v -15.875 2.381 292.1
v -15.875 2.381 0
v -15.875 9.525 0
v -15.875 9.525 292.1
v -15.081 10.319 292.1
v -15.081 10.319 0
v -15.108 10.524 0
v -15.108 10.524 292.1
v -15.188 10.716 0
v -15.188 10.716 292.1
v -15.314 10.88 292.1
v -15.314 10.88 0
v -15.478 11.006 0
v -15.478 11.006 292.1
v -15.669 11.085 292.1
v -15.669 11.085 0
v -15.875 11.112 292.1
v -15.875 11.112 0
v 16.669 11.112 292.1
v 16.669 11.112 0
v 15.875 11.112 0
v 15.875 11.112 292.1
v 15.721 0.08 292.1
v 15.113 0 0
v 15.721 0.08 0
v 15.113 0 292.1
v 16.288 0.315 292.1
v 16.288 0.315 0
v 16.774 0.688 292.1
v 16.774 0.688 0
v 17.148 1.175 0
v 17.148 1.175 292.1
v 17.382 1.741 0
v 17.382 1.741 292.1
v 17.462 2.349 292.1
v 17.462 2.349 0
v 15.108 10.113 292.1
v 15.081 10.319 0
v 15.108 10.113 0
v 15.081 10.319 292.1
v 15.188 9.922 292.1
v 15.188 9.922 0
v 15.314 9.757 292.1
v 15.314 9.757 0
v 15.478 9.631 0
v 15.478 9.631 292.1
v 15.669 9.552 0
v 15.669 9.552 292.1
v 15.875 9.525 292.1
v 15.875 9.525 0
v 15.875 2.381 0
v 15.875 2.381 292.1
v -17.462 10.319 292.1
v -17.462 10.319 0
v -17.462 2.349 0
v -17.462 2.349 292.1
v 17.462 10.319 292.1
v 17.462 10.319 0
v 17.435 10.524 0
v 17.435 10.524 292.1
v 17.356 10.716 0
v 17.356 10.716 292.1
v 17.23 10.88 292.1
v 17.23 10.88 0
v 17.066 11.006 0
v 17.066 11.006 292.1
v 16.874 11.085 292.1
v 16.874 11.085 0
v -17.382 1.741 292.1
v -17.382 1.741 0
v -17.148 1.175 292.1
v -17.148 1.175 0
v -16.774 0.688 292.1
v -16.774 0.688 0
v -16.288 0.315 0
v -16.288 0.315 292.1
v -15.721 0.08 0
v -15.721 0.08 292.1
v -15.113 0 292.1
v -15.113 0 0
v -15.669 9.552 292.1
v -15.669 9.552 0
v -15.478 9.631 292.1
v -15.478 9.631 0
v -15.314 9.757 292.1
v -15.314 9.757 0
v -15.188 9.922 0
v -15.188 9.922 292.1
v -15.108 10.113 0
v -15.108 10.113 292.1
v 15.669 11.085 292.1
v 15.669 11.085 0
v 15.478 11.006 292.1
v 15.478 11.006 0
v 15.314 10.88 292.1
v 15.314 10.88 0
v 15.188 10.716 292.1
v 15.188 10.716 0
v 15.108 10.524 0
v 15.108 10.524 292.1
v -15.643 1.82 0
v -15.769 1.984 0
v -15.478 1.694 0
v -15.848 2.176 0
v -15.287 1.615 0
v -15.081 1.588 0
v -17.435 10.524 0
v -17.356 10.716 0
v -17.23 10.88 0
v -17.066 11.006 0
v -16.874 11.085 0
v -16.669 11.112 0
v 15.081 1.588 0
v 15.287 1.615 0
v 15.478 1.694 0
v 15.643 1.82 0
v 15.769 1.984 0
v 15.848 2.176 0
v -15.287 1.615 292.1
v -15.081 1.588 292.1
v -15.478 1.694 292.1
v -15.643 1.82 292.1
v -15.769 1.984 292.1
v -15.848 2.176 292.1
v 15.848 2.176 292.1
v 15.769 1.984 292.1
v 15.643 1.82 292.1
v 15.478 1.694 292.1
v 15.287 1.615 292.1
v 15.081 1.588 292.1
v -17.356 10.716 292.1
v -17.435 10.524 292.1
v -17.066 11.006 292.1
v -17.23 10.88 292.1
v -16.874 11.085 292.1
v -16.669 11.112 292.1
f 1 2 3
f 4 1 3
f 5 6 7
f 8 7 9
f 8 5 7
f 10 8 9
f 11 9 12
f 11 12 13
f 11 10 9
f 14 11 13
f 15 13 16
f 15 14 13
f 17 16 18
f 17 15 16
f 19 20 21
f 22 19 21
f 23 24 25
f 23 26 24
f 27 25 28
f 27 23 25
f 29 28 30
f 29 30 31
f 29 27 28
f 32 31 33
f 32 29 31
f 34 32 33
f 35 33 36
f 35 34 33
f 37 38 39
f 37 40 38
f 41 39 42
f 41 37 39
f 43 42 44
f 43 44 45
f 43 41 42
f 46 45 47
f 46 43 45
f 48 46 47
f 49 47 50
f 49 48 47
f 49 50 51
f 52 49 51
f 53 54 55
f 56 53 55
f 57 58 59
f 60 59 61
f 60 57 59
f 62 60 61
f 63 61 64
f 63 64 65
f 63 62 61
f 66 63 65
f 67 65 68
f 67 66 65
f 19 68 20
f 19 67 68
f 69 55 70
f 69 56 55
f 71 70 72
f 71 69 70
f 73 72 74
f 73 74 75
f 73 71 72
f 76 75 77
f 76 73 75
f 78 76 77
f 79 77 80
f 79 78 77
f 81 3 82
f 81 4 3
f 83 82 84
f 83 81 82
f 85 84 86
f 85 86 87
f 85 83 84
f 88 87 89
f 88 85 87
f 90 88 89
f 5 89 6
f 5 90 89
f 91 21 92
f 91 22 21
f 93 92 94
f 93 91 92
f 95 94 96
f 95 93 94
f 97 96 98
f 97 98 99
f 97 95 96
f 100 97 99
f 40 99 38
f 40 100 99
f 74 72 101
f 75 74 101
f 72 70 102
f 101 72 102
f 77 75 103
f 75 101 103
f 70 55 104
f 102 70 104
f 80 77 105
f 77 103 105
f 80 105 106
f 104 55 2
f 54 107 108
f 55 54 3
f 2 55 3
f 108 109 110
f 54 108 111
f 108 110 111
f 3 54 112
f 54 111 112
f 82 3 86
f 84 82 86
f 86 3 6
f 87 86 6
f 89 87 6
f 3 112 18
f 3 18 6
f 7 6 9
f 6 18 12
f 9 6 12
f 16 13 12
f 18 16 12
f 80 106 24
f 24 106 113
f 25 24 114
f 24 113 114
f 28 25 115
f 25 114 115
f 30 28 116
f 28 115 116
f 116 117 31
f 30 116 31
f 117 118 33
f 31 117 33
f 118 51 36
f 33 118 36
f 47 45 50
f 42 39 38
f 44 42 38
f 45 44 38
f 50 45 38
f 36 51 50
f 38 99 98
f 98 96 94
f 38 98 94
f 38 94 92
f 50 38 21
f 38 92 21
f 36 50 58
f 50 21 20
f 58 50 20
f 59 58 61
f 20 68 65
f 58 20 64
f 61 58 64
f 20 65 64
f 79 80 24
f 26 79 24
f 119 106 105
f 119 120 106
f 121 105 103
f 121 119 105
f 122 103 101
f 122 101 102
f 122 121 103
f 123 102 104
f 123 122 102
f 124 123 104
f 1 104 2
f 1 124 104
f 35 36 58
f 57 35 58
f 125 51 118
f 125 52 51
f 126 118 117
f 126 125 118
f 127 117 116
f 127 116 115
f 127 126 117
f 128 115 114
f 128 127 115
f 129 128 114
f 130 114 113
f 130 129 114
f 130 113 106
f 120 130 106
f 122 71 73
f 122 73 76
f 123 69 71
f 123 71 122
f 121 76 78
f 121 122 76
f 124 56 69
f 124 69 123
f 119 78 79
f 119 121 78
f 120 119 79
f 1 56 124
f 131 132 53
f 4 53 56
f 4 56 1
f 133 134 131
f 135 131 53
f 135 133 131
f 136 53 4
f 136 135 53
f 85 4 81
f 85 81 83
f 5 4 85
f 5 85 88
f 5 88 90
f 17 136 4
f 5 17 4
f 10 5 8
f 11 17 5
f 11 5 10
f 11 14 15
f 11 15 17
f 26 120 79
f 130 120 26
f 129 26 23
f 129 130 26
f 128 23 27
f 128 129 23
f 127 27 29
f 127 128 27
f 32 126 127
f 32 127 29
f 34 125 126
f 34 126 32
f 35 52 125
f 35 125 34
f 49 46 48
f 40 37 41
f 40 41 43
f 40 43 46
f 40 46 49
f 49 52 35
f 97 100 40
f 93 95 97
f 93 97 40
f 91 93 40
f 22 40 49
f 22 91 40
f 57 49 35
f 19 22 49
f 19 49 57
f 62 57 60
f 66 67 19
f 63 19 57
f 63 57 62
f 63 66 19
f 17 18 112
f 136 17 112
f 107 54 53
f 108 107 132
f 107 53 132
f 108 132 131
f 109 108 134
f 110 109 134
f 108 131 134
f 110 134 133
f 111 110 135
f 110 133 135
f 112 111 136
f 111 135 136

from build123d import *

# Parameters (mm, degrees)
BOSS_EXTRUDE1_DEPTH = 292.1
FILLET1_R           = 0.79375
FILLET2_R           = 2.3495


with BuildPart() as part:
    # Sketch1 → Boss-Extrude1 (new body)
    with BuildSketch(Plane.XY):
        Polygon((-17.4625, 11.1125), (-17.4625, 0), (17.4625, 0), (17.4625, 11.1125), (15.08125, 11.1125), (15.08125, 9.525), (15.875, 9.525), (15.875, 1.5875), (-15.875, 1.5875), (-15.875, 9.525), (-15.08125, 9.525), (-15.08125, 11.1125), align=None)
    extrude(amount=BOSS_EXTRUDE1_DEPTH)

    # Fillet1
    fillet1_edges = [part.edges().sort_by_distance(p)[0] for p in [
        (15.875, 1.5875, 146.05),
        (-15.875, 1.5875, 146.05),
        (-15.08125, 9.525, 146.05),
        (-15.08125, 11.1125, 146.05),
        (-17.4625, 11.1125, 146.05),
        (17.4625, 11.1125, 146.05),
        (15.08125, 11.1125, 146.05),
        (15.08125, 9.525, 146.05),
    ]]
    fillet(fillet1_edges, radius=FILLET1_R - 0.0001)  # a hair under: the kernel refuses the full size

    # Fillet2
    fillet2_edges = [part.edges().sort_by_distance(p)[0] for p in [
        (17.4625, 0, 146.05),
        (-17.4625, 0, 146.05),
    ]]
    fillet(fillet2_edges, radius=FILLET2_R)


solid = part.part
